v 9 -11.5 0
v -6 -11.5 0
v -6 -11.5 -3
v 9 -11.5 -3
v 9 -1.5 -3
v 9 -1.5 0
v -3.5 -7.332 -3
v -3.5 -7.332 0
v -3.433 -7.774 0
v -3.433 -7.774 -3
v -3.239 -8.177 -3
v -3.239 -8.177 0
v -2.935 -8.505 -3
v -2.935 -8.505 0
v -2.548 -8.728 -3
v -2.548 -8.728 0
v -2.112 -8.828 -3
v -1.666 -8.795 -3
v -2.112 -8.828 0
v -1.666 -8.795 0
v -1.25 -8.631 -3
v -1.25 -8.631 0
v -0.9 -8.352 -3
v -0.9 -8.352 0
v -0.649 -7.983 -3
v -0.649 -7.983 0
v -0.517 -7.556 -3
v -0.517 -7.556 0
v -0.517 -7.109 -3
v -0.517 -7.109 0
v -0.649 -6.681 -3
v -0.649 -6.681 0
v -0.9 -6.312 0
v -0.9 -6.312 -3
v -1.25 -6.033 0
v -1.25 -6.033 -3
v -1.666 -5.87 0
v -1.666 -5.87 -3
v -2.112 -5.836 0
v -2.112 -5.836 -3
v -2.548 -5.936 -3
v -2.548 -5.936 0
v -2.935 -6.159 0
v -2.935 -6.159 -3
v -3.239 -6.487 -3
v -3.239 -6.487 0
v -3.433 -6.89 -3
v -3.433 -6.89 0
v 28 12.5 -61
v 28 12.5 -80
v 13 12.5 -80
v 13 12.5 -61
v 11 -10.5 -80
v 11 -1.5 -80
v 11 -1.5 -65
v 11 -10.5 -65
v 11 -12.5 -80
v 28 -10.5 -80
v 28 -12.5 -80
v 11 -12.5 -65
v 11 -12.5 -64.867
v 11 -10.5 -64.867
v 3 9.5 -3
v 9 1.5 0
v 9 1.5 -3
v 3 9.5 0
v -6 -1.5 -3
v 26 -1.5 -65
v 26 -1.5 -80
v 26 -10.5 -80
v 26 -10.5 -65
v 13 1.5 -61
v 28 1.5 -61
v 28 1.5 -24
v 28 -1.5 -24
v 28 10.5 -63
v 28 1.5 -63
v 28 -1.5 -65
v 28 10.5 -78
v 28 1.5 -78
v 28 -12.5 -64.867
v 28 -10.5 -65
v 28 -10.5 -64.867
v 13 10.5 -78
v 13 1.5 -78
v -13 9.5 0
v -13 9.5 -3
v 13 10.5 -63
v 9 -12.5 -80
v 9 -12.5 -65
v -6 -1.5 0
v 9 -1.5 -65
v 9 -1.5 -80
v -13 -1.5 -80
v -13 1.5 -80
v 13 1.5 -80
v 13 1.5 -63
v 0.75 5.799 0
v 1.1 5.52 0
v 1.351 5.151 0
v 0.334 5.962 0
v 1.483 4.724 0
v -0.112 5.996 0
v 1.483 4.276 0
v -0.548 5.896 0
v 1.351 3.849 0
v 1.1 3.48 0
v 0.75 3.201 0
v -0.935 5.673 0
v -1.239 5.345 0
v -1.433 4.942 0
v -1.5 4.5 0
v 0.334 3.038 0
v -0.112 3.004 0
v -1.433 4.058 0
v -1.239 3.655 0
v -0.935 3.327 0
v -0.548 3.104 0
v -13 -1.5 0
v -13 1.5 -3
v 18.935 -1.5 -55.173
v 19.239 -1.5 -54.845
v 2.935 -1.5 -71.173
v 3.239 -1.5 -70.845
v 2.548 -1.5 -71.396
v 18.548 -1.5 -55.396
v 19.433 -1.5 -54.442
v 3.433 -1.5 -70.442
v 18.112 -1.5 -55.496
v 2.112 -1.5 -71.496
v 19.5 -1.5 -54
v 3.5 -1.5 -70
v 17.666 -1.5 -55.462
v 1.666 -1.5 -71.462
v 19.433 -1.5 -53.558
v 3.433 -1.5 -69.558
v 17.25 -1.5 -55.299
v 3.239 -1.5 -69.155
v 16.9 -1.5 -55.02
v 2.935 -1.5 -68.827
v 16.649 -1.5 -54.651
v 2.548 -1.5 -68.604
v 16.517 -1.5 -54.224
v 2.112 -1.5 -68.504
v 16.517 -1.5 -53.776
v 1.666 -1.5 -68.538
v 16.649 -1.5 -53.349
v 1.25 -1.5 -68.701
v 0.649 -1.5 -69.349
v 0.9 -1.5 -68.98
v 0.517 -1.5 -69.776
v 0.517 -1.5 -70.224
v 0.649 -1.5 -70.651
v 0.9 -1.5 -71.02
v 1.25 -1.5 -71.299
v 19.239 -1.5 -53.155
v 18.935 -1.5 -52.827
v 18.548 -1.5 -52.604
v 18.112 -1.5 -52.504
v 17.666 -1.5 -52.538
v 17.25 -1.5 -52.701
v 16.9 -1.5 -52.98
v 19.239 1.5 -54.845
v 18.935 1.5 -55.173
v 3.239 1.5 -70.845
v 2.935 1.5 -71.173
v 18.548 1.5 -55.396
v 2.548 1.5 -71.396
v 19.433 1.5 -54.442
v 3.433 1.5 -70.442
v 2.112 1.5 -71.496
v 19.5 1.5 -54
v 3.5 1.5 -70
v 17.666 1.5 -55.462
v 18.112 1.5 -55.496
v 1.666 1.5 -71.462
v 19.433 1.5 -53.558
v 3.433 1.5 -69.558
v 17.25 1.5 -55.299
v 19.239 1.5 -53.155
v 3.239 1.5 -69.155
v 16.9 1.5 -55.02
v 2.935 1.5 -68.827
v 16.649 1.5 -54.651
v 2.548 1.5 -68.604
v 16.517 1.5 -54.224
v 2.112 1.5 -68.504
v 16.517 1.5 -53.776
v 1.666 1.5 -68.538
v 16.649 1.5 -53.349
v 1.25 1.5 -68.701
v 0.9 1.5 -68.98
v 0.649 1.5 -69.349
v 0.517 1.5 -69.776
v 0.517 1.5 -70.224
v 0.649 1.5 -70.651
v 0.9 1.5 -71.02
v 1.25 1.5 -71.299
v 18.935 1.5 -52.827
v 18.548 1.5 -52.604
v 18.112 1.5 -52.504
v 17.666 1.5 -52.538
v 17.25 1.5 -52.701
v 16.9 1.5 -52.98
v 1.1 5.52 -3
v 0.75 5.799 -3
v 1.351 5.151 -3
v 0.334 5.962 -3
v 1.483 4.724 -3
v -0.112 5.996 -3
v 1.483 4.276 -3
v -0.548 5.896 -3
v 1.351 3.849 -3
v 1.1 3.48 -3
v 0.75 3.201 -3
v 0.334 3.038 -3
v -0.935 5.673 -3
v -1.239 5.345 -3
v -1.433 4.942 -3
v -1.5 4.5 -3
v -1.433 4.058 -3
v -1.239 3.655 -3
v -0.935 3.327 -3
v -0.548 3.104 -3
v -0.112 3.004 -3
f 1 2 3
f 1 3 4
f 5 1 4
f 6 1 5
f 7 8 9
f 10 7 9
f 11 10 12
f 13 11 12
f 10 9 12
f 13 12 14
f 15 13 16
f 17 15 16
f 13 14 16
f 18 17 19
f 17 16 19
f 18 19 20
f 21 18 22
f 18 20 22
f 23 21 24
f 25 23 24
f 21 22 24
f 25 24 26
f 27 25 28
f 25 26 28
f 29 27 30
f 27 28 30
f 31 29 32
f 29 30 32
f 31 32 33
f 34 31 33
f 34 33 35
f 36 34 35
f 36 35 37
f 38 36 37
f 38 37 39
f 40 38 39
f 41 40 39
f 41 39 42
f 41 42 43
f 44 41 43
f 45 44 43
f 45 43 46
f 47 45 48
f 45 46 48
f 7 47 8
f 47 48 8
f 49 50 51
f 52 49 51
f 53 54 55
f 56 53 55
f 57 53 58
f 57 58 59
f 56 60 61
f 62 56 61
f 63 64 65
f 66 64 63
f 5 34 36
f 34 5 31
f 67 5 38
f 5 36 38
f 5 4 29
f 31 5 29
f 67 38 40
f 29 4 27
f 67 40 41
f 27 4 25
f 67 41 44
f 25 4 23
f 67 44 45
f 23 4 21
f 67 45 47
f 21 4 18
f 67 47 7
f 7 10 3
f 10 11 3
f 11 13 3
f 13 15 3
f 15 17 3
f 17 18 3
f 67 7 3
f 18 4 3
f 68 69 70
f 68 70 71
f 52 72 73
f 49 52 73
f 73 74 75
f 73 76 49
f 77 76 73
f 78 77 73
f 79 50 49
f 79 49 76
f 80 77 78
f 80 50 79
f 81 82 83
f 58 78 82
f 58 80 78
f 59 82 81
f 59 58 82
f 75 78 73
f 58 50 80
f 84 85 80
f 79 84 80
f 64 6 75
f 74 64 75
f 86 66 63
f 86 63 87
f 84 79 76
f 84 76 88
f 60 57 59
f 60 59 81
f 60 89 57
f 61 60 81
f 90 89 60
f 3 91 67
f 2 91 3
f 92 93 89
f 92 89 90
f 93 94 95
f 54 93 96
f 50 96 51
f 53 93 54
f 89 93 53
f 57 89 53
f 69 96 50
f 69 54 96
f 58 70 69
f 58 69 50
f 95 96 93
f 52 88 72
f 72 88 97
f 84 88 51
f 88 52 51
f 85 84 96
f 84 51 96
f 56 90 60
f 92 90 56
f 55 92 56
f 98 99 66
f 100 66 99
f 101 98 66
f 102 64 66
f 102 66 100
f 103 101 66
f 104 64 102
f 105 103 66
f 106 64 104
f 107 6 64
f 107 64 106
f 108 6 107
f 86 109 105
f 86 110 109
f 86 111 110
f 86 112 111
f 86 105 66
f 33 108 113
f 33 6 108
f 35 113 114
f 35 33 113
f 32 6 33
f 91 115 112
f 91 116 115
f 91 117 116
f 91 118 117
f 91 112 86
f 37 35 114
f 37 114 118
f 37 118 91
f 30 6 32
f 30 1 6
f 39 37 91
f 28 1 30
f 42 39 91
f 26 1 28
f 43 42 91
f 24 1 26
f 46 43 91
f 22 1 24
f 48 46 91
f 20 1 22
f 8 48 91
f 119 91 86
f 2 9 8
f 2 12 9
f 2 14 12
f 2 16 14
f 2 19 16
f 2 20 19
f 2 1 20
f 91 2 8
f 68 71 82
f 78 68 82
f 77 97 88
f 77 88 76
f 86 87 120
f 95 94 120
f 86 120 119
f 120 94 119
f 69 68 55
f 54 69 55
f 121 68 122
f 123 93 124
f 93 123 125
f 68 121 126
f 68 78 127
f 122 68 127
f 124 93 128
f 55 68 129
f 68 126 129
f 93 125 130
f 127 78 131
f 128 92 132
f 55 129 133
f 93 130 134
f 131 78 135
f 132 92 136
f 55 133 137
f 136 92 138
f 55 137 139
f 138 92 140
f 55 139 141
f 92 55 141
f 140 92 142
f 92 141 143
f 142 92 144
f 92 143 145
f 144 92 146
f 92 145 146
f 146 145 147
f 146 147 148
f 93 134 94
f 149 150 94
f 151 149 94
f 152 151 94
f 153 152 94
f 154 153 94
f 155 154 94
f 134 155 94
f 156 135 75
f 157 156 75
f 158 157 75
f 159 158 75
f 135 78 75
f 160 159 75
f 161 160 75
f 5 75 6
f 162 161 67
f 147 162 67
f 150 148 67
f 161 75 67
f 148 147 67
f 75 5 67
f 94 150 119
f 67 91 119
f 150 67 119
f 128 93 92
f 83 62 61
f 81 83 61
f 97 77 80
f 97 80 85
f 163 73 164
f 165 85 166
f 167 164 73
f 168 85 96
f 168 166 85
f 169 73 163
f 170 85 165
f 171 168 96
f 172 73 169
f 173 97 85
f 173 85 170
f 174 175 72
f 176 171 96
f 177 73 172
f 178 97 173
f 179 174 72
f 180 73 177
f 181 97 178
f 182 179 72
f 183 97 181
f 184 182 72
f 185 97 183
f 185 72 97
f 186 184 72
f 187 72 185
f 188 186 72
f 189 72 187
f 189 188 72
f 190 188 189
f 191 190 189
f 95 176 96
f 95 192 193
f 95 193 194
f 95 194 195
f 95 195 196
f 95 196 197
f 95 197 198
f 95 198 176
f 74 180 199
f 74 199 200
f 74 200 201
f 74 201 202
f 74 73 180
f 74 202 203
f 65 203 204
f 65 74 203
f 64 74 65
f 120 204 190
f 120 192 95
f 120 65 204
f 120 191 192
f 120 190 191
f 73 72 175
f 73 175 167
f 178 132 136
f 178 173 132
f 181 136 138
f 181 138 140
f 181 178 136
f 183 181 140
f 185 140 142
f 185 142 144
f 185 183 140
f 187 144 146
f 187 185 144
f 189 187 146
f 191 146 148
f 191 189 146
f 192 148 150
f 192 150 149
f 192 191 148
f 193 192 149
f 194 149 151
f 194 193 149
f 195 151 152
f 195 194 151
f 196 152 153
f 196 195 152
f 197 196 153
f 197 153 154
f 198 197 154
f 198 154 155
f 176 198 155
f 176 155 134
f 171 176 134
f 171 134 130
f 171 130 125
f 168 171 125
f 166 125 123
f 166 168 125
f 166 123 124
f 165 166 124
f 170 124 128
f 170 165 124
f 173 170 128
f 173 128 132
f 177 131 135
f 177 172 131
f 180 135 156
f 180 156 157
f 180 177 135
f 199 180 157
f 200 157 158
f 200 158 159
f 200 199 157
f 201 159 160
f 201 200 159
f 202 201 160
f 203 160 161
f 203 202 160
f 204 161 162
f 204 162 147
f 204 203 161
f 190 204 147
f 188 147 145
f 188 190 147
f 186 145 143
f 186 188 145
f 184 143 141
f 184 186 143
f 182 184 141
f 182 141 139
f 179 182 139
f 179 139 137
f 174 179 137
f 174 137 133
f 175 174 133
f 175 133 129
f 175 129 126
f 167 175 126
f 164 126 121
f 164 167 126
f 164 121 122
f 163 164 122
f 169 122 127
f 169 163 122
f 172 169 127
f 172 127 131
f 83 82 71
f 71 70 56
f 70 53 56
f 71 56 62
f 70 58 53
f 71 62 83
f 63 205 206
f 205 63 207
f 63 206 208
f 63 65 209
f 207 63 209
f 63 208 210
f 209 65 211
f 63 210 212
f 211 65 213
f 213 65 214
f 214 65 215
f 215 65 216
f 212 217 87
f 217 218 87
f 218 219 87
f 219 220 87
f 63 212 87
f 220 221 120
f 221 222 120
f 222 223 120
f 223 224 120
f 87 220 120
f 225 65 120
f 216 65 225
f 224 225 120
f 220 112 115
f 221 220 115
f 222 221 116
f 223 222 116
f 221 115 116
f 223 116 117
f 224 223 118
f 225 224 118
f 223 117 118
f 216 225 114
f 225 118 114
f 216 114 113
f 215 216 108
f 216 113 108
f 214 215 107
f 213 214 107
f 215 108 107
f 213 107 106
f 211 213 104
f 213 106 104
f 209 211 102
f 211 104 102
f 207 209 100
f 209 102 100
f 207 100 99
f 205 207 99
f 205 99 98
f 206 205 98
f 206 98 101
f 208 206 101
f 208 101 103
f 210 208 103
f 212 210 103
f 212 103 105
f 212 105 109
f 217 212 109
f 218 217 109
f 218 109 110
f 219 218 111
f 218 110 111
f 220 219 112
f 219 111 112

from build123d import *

# Parameters (mm, degrees)
SKETCH_R     = 1.5
PAD_DEPTH    = 1.5
SKETCH001_R  = 1.5
PAD001_DEPTH = 3
SKETCH002_W  = 2
SKETCH002_H  = 15
PAD002_DEPTH = 11
SKETCH003_W  = 15.132667
SKETCH003_H  = 2
PAD003_DEPTH = 17
SKETCH004_W  = 15
SKETCH004_H  = 2
PAD004_DEPTH = 11
SKETCH005_W  = 15
SKETCH005_H  = 2
PAD005_DEPTH = 17


with BuildPart() as part:
    # Sketch → Pad (new body, symmetric)
    with BuildSketch(Plane.XZ):
        Polygon((28, -24), (28, -80), (-13, -80), (-13, 0), (9, 0), align=None)
        with Locations((18, -54)):
            Circle(SKETCH_R, mode=Mode.SUBTRACT)
        with Locations((2, -70)):
            Circle(SKETCH_R, mode=Mode.SUBTRACT)
    extrude(amount=PAD_DEPTH, both=True)

    # Sketch001 (on Face4 of Pad) → Pad001 (join)
    with BuildSketch(Plane(origin=(0, 0, 0), x_dir=(-1, 0, 0), z_dir=(0, 0, 1))):
        Polygon((-9, -1.5), (-3, -9.5), (13, -9.5), (13, -1.5), (6, 1.5), (6, 11.5), (-9, 11.5), (-9, 1.5), align=None)
        with Locations((0, -4.5)):
            Circle(SKETCH001_R, mode=Mode.SUBTRACT)
        with Locations((2, 7.33216)):
            Circle(SKETCH001_R, mode=Mode.SUBTRACT)
    extrude(amount=-PAD001_DEPTH)

    # Sketch002 (on Face5 of Pad001) → Pad002 (join)
    with BuildSketch(Plane.XZ.offset(1.5)):
        with Locations((27, -72.5)):
            Rectangle(SKETCH002_W, SKETCH002_H)
        with Locations((10, -72.5)):
            Rectangle(SKETCH002_W, SKETCH002_H)
    extrude(amount=PAD002_DEPTH)

    # Sketch003 (on Face21 of Pad002) → Pad003 (join)
    with BuildSketch(Plane(origin=(11, 0, 0), x_dir=(0, 0, 1), z_dir=(1, 0, 0))):
        with Locations((-72.433667, 11.5)):
            Rectangle(SKETCH003_W, SKETCH003_H)
    extrude(amount=PAD003_DEPTH)

    # Sketch004 (on Face4 of Pad003) → Pad004 (join)
    with BuildSketch(Plane(origin=(0, 1.5, 0), x_dir=(1, 0, 0), z_dir=(0, 1, 0))):
        with Locations((20.5, 79)):
            Rectangle(SKETCH004_W, SKETCH004_H)
        with Locations((20.5, 62)):
            Rectangle(SKETCH004_W, SKETCH004_H)
    extrude(amount=PAD004_DEPTH)

    # Sketch005 (on Face17 of Pad004) → Pad005 (join)
    with BuildSketch(Plane(origin=(0, 0, -78), x_dir=(-1, 0, 0), z_dir=(0, 0, 1))):
        with Locations((-20.5, -11.5)):
            Rectangle(SKETCH005_W, SKETCH005_H)
    extrude(amount=PAD005_DEPTH)


solid = part.part
